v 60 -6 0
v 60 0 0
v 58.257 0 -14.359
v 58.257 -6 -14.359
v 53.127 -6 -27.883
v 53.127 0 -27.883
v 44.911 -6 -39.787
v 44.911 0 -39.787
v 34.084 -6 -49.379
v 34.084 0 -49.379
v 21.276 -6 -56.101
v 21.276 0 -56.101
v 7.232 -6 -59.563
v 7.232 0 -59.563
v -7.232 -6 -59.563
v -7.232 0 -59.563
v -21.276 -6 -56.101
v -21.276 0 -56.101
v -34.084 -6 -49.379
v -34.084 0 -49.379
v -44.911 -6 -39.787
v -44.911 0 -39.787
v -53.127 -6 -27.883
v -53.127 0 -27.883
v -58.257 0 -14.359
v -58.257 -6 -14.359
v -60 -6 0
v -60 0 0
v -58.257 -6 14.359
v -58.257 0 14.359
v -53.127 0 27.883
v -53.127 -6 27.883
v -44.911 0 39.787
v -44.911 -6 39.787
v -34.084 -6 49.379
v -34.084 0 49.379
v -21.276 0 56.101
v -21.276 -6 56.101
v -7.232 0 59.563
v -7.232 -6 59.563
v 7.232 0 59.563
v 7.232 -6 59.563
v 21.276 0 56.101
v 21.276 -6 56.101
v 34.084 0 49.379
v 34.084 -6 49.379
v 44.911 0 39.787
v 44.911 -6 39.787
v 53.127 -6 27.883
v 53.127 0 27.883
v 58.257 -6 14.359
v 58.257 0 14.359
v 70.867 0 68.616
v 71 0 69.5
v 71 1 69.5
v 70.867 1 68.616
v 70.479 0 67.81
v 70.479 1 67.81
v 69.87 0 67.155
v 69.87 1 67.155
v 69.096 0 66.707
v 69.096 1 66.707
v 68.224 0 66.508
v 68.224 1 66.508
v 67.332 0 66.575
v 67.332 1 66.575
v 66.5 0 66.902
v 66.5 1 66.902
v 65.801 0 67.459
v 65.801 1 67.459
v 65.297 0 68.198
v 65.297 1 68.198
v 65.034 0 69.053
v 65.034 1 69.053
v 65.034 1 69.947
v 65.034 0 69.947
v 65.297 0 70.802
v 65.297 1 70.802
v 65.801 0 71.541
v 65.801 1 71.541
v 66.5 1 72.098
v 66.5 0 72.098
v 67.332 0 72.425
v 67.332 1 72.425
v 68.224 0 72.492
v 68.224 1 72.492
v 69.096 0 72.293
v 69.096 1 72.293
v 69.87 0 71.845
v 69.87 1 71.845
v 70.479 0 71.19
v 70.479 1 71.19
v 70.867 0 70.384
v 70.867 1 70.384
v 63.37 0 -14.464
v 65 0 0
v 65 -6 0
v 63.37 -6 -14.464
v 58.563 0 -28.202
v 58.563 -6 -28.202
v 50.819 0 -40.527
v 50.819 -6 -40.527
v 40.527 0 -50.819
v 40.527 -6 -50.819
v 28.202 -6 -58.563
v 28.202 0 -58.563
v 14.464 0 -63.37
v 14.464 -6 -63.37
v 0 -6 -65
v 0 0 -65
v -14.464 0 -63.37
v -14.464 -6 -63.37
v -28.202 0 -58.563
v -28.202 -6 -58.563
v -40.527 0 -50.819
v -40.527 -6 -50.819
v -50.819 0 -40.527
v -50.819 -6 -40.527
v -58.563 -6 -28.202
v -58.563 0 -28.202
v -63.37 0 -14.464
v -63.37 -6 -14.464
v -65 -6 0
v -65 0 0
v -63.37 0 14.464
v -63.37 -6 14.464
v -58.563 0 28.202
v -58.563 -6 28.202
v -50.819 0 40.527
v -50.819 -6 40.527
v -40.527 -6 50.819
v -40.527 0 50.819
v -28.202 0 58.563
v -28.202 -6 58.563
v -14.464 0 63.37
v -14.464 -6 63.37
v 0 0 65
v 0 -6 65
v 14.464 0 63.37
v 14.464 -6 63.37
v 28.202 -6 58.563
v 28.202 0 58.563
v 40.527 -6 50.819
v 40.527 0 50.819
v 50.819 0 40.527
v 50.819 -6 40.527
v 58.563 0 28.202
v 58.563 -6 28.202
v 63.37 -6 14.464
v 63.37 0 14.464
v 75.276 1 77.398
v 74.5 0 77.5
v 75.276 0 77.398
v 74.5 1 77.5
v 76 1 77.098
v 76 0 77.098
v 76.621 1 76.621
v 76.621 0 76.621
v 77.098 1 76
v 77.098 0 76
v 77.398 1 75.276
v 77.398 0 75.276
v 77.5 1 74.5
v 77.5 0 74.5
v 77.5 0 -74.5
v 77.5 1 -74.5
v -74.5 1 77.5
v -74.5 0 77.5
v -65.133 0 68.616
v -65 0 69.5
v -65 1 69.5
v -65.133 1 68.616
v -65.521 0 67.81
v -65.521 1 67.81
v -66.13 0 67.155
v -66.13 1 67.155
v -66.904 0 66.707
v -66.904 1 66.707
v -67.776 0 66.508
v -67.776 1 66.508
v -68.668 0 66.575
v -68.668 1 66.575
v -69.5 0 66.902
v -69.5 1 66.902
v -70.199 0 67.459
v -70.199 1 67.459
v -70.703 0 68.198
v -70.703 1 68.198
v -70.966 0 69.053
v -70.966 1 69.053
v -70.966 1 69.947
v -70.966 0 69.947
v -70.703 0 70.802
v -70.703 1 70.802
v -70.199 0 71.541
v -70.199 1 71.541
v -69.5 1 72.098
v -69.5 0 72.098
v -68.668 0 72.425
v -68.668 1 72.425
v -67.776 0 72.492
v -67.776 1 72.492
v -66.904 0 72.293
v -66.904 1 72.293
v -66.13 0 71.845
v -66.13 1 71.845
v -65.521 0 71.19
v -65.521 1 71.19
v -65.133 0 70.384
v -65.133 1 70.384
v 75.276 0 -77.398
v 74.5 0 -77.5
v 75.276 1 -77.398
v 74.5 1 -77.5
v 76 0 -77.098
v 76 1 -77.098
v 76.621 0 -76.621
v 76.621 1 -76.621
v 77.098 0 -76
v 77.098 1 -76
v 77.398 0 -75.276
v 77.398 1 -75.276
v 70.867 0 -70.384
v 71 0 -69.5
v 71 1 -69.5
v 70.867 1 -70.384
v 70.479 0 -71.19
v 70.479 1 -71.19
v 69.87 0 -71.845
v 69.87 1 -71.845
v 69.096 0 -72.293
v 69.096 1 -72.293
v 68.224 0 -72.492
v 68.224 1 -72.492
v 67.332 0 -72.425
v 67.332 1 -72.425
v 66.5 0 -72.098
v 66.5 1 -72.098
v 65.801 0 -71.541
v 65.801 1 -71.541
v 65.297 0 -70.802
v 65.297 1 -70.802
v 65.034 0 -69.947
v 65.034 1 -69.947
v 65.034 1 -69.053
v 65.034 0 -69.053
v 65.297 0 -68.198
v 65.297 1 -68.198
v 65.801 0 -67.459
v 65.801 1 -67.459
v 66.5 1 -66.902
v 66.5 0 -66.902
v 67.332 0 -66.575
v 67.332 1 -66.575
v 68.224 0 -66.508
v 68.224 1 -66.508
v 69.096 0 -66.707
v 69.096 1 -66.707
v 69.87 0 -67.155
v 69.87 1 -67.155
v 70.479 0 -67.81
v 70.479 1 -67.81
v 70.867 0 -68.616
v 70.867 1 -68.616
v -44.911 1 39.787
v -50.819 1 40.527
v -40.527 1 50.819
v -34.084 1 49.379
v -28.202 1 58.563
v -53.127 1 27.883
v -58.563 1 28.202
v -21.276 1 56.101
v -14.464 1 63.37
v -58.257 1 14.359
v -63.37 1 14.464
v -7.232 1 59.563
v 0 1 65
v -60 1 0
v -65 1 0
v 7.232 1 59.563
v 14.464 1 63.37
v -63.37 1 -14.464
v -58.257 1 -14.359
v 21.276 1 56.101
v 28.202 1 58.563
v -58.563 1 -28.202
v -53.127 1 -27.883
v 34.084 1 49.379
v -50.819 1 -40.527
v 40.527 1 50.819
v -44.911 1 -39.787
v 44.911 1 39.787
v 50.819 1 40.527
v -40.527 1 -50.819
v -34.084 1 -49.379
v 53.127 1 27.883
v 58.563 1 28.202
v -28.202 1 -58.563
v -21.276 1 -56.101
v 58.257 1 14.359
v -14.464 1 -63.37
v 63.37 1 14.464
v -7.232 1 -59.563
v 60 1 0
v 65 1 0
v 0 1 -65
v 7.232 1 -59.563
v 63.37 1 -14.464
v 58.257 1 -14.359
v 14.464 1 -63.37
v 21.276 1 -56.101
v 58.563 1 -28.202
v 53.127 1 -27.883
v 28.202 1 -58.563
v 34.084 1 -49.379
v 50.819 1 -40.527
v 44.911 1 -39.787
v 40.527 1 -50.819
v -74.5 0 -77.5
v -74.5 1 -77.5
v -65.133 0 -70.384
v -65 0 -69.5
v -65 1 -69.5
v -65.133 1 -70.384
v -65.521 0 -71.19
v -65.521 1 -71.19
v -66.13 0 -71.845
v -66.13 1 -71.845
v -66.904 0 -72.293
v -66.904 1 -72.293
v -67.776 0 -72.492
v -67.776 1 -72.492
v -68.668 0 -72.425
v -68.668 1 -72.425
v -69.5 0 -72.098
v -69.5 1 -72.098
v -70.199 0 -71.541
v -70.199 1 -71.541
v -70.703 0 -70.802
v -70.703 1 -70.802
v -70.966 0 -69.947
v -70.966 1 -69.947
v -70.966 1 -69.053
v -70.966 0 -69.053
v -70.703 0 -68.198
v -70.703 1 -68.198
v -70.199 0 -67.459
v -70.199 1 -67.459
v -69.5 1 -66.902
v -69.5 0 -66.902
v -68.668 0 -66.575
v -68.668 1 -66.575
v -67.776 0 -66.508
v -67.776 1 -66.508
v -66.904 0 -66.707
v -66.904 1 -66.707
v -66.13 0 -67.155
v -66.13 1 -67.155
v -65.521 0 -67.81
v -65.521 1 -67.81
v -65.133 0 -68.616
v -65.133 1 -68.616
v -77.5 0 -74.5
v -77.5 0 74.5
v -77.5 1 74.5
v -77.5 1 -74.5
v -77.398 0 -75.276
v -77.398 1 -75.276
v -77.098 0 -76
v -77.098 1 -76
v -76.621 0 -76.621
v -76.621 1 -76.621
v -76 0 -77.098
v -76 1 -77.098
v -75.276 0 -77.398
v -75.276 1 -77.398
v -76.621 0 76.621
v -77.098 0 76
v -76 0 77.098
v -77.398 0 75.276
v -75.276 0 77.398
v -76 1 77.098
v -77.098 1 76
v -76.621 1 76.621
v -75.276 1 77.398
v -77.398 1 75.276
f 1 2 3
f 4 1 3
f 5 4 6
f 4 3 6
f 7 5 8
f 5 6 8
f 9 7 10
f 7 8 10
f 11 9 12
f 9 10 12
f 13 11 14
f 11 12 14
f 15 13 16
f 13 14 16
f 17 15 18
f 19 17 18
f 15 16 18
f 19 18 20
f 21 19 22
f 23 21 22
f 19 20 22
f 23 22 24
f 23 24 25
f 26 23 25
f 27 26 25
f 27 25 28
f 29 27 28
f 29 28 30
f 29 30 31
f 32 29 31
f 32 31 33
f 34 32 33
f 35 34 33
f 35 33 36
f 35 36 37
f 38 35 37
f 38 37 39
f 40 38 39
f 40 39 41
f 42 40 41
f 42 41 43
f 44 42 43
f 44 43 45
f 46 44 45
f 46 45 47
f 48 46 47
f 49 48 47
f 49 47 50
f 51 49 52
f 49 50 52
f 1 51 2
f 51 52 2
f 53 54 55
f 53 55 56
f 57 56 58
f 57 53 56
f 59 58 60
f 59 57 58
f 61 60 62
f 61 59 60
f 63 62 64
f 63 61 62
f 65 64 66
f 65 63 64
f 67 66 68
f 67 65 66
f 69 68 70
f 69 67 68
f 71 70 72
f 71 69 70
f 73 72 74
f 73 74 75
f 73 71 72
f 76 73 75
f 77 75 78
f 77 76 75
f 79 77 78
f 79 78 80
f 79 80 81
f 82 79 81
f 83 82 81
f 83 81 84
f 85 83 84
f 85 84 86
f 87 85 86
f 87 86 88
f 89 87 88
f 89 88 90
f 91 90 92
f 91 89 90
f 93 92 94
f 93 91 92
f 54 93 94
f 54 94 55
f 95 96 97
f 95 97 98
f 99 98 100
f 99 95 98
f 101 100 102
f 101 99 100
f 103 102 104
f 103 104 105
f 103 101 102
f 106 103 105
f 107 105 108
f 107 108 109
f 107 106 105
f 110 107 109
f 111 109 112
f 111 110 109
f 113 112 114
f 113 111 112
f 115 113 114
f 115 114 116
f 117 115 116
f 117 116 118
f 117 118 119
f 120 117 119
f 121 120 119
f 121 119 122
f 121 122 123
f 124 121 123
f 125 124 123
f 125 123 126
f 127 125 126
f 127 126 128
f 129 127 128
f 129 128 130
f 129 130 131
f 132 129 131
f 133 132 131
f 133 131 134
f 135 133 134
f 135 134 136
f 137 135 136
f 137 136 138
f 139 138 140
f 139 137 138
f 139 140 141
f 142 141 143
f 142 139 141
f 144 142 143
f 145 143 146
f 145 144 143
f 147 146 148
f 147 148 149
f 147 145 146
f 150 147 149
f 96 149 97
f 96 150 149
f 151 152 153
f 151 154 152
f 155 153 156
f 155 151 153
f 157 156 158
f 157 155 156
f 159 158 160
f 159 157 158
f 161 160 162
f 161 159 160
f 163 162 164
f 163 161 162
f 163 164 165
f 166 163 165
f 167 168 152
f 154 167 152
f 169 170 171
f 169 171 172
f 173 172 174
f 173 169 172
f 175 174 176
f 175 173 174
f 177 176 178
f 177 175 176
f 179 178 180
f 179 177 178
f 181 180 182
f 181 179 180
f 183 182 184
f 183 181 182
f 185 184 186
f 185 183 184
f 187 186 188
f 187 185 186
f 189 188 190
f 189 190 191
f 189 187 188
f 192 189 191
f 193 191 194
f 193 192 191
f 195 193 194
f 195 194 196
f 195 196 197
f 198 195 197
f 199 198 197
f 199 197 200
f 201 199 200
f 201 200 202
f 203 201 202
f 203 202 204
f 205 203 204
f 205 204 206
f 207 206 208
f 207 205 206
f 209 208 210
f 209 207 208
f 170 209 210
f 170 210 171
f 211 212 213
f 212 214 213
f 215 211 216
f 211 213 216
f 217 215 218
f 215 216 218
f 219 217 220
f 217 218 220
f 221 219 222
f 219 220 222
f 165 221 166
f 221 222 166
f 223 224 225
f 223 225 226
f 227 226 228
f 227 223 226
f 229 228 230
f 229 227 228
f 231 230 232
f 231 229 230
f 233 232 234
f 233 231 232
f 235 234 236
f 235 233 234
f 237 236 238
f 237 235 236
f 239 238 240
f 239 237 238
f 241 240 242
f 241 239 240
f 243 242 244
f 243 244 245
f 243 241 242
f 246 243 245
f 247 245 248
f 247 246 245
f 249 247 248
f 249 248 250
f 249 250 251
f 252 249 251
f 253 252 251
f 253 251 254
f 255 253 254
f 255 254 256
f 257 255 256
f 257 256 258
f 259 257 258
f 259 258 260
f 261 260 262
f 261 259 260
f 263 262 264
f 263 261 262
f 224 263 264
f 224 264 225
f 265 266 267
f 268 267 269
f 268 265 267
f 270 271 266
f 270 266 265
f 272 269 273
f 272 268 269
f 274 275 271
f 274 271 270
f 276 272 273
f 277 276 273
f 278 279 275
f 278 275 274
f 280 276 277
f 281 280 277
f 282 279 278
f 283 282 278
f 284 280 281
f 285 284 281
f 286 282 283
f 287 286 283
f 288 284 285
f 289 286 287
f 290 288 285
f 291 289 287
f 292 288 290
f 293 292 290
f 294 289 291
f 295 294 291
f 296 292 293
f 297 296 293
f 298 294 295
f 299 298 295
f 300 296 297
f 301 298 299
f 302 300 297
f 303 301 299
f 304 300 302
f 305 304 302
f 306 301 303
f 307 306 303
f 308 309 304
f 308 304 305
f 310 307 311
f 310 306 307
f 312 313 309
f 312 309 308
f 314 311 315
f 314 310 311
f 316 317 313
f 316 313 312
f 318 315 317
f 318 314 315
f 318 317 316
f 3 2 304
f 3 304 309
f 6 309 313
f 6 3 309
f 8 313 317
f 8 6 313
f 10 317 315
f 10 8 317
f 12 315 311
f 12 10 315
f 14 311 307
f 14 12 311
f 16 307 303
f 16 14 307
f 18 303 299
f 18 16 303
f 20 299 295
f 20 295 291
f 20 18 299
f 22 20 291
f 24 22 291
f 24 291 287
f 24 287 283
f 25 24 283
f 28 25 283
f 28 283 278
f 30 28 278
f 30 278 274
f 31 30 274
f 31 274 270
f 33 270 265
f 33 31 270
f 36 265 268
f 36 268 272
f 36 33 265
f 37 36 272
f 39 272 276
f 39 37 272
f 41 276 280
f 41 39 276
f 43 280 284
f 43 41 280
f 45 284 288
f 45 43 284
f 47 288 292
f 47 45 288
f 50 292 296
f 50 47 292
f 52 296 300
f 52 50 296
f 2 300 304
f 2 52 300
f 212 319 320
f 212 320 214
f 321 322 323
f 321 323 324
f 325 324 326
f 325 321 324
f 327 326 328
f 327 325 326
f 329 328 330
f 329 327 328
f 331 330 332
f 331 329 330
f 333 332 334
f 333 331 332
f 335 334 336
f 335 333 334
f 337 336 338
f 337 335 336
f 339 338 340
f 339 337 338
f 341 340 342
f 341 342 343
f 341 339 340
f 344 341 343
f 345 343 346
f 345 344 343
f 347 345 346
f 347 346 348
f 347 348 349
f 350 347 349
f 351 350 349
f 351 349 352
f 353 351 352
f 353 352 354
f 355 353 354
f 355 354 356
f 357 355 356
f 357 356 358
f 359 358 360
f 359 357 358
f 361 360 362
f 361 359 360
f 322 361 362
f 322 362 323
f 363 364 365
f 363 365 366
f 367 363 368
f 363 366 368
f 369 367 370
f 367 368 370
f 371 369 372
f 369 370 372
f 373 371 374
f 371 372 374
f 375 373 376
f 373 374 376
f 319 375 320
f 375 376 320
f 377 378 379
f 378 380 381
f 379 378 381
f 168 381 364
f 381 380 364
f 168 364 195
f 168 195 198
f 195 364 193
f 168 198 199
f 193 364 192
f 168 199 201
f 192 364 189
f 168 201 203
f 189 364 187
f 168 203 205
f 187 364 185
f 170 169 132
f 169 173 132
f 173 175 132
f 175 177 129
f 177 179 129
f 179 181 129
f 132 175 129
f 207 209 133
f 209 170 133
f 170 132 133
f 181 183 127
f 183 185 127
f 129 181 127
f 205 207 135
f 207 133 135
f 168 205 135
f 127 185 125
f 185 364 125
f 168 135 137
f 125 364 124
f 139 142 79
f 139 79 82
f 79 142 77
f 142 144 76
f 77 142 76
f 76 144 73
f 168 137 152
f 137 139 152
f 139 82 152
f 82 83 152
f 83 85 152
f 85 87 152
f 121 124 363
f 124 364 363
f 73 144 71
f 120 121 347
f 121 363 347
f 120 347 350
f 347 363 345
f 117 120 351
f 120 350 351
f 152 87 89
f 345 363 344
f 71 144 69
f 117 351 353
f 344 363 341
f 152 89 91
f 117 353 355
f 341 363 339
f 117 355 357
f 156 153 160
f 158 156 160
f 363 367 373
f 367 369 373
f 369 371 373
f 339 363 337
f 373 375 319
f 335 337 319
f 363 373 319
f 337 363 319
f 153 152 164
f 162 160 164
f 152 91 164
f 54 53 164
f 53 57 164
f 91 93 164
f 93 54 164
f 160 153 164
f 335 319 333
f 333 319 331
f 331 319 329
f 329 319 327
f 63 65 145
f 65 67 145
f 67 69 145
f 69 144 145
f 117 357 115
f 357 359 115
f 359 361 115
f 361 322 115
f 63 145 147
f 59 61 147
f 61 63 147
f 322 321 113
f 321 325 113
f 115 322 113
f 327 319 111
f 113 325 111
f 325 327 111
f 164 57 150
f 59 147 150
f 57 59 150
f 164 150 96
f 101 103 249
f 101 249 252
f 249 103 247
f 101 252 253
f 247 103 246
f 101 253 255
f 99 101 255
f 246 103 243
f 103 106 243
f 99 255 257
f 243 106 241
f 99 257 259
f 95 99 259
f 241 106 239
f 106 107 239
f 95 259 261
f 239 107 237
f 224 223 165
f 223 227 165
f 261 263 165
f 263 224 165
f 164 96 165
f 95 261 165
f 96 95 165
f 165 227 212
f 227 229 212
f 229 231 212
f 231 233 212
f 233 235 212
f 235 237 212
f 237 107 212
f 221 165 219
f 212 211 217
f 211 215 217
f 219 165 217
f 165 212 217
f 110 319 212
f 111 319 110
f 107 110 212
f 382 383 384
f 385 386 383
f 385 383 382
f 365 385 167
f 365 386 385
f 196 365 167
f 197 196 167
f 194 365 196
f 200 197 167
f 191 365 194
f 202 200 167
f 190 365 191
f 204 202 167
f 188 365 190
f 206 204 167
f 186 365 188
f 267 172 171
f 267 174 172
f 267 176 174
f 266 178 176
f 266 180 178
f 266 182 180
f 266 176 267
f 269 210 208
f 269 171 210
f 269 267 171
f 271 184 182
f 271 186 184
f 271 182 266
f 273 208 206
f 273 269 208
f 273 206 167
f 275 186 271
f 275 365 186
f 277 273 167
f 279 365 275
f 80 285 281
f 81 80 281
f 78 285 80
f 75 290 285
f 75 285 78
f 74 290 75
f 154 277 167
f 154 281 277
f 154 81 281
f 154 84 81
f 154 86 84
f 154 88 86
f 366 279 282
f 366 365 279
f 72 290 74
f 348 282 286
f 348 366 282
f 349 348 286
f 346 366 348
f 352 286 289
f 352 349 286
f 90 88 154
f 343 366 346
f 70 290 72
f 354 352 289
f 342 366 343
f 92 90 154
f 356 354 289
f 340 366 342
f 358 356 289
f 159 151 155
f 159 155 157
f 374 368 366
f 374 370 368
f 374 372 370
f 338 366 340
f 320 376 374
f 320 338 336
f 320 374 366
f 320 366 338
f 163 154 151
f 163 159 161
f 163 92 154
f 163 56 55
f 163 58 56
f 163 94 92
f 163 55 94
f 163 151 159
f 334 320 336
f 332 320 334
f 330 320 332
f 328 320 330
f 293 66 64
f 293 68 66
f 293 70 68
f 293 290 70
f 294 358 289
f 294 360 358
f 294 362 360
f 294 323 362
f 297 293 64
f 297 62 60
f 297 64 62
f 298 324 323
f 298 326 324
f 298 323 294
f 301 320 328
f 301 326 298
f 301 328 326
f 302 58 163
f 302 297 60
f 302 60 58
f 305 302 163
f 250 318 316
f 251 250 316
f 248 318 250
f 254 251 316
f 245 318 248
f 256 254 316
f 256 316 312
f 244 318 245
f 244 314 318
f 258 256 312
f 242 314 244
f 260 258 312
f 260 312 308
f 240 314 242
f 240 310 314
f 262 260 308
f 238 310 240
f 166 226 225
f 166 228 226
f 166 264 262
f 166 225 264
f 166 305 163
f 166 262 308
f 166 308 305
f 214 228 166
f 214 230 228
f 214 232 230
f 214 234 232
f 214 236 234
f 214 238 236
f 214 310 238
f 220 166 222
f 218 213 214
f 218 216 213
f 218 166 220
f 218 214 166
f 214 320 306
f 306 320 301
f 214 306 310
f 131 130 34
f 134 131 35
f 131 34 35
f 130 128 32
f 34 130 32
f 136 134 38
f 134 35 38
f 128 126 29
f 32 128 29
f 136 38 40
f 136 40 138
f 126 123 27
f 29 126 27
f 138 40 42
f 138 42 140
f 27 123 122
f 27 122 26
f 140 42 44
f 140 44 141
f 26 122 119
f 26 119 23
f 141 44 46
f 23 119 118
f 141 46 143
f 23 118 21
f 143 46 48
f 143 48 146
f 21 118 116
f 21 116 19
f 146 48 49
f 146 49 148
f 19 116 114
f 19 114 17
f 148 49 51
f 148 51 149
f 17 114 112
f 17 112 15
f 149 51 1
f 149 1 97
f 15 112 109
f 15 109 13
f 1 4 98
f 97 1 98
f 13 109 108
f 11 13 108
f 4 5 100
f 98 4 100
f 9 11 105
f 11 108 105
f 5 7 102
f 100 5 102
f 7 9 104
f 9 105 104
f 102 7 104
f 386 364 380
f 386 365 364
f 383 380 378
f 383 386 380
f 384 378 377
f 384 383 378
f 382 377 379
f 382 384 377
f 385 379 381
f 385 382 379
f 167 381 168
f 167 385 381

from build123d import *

# Parameters (mm, degrees)
SKETCH1_W           = 155
SKETCH1_H           = 155
SKETCH1_R           = 3
SKETCH1_R_2         = 60
BOSS_EXTRUDE1_DEPTH = 1
FILLET1_R           = 3
SKETCH2_R           = 65
SKETCH2_R_2         = 60
BOSS_EXTRUDE2_DEPTH = 7


with BuildPart() as part:
    # Sketch1 → Boss-Extrude1 (new body)
    with BuildSketch(Plane(origin=(0, 0, 0), x_dir=(1, 0, 0), z_dir=(0, 1, 0))):
        Rectangle(SKETCH1_W, SKETCH1_H)
        with Locations((-68, 69.5)):
            Circle(SKETCH1_R, mode=Mode.SUBTRACT)
        with Locations((68, 69.5)):
            Circle(SKETCH1_R, mode=Mode.SUBTRACT)
        with Locations((-68, -69.5)):
            Circle(SKETCH1_R, mode=Mode.SUBTRACT)
        with Locations((68, -69.5)):
            Circle(SKETCH1_R, mode=Mode.SUBTRACT)
        Circle(SKETCH1_R_2, mode=Mode.SUBTRACT)
    extrude(amount=BOSS_EXTRUDE1_DEPTH)

    # Fillet1
    fillet1_edges = [part.edges().sort_by_distance(p)[0] for p in [
        (77.5, 0.5, 77.5),
        (-77.5, 0.5, 77.5),
        (-77.5, 0.5, -77.5),
        (77.5, 0.5, -77.5),
    ]]
    fillet(fillet1_edges, radius=FILLET1_R)

    # Sketch2 → Boss-Extrude2 (add)
    with BuildSketch(Plane(origin=(0, 1, 0), x_dir=(1, 0, 0), z_dir=(0, 1, 0))):
        Circle(SKETCH2_R)
        Circle(SKETCH2_R_2, mode=Mode.SUBTRACT)
    extrude(amount=-BOSS_EXTRUDE2_DEPTH)


solid = part.part
